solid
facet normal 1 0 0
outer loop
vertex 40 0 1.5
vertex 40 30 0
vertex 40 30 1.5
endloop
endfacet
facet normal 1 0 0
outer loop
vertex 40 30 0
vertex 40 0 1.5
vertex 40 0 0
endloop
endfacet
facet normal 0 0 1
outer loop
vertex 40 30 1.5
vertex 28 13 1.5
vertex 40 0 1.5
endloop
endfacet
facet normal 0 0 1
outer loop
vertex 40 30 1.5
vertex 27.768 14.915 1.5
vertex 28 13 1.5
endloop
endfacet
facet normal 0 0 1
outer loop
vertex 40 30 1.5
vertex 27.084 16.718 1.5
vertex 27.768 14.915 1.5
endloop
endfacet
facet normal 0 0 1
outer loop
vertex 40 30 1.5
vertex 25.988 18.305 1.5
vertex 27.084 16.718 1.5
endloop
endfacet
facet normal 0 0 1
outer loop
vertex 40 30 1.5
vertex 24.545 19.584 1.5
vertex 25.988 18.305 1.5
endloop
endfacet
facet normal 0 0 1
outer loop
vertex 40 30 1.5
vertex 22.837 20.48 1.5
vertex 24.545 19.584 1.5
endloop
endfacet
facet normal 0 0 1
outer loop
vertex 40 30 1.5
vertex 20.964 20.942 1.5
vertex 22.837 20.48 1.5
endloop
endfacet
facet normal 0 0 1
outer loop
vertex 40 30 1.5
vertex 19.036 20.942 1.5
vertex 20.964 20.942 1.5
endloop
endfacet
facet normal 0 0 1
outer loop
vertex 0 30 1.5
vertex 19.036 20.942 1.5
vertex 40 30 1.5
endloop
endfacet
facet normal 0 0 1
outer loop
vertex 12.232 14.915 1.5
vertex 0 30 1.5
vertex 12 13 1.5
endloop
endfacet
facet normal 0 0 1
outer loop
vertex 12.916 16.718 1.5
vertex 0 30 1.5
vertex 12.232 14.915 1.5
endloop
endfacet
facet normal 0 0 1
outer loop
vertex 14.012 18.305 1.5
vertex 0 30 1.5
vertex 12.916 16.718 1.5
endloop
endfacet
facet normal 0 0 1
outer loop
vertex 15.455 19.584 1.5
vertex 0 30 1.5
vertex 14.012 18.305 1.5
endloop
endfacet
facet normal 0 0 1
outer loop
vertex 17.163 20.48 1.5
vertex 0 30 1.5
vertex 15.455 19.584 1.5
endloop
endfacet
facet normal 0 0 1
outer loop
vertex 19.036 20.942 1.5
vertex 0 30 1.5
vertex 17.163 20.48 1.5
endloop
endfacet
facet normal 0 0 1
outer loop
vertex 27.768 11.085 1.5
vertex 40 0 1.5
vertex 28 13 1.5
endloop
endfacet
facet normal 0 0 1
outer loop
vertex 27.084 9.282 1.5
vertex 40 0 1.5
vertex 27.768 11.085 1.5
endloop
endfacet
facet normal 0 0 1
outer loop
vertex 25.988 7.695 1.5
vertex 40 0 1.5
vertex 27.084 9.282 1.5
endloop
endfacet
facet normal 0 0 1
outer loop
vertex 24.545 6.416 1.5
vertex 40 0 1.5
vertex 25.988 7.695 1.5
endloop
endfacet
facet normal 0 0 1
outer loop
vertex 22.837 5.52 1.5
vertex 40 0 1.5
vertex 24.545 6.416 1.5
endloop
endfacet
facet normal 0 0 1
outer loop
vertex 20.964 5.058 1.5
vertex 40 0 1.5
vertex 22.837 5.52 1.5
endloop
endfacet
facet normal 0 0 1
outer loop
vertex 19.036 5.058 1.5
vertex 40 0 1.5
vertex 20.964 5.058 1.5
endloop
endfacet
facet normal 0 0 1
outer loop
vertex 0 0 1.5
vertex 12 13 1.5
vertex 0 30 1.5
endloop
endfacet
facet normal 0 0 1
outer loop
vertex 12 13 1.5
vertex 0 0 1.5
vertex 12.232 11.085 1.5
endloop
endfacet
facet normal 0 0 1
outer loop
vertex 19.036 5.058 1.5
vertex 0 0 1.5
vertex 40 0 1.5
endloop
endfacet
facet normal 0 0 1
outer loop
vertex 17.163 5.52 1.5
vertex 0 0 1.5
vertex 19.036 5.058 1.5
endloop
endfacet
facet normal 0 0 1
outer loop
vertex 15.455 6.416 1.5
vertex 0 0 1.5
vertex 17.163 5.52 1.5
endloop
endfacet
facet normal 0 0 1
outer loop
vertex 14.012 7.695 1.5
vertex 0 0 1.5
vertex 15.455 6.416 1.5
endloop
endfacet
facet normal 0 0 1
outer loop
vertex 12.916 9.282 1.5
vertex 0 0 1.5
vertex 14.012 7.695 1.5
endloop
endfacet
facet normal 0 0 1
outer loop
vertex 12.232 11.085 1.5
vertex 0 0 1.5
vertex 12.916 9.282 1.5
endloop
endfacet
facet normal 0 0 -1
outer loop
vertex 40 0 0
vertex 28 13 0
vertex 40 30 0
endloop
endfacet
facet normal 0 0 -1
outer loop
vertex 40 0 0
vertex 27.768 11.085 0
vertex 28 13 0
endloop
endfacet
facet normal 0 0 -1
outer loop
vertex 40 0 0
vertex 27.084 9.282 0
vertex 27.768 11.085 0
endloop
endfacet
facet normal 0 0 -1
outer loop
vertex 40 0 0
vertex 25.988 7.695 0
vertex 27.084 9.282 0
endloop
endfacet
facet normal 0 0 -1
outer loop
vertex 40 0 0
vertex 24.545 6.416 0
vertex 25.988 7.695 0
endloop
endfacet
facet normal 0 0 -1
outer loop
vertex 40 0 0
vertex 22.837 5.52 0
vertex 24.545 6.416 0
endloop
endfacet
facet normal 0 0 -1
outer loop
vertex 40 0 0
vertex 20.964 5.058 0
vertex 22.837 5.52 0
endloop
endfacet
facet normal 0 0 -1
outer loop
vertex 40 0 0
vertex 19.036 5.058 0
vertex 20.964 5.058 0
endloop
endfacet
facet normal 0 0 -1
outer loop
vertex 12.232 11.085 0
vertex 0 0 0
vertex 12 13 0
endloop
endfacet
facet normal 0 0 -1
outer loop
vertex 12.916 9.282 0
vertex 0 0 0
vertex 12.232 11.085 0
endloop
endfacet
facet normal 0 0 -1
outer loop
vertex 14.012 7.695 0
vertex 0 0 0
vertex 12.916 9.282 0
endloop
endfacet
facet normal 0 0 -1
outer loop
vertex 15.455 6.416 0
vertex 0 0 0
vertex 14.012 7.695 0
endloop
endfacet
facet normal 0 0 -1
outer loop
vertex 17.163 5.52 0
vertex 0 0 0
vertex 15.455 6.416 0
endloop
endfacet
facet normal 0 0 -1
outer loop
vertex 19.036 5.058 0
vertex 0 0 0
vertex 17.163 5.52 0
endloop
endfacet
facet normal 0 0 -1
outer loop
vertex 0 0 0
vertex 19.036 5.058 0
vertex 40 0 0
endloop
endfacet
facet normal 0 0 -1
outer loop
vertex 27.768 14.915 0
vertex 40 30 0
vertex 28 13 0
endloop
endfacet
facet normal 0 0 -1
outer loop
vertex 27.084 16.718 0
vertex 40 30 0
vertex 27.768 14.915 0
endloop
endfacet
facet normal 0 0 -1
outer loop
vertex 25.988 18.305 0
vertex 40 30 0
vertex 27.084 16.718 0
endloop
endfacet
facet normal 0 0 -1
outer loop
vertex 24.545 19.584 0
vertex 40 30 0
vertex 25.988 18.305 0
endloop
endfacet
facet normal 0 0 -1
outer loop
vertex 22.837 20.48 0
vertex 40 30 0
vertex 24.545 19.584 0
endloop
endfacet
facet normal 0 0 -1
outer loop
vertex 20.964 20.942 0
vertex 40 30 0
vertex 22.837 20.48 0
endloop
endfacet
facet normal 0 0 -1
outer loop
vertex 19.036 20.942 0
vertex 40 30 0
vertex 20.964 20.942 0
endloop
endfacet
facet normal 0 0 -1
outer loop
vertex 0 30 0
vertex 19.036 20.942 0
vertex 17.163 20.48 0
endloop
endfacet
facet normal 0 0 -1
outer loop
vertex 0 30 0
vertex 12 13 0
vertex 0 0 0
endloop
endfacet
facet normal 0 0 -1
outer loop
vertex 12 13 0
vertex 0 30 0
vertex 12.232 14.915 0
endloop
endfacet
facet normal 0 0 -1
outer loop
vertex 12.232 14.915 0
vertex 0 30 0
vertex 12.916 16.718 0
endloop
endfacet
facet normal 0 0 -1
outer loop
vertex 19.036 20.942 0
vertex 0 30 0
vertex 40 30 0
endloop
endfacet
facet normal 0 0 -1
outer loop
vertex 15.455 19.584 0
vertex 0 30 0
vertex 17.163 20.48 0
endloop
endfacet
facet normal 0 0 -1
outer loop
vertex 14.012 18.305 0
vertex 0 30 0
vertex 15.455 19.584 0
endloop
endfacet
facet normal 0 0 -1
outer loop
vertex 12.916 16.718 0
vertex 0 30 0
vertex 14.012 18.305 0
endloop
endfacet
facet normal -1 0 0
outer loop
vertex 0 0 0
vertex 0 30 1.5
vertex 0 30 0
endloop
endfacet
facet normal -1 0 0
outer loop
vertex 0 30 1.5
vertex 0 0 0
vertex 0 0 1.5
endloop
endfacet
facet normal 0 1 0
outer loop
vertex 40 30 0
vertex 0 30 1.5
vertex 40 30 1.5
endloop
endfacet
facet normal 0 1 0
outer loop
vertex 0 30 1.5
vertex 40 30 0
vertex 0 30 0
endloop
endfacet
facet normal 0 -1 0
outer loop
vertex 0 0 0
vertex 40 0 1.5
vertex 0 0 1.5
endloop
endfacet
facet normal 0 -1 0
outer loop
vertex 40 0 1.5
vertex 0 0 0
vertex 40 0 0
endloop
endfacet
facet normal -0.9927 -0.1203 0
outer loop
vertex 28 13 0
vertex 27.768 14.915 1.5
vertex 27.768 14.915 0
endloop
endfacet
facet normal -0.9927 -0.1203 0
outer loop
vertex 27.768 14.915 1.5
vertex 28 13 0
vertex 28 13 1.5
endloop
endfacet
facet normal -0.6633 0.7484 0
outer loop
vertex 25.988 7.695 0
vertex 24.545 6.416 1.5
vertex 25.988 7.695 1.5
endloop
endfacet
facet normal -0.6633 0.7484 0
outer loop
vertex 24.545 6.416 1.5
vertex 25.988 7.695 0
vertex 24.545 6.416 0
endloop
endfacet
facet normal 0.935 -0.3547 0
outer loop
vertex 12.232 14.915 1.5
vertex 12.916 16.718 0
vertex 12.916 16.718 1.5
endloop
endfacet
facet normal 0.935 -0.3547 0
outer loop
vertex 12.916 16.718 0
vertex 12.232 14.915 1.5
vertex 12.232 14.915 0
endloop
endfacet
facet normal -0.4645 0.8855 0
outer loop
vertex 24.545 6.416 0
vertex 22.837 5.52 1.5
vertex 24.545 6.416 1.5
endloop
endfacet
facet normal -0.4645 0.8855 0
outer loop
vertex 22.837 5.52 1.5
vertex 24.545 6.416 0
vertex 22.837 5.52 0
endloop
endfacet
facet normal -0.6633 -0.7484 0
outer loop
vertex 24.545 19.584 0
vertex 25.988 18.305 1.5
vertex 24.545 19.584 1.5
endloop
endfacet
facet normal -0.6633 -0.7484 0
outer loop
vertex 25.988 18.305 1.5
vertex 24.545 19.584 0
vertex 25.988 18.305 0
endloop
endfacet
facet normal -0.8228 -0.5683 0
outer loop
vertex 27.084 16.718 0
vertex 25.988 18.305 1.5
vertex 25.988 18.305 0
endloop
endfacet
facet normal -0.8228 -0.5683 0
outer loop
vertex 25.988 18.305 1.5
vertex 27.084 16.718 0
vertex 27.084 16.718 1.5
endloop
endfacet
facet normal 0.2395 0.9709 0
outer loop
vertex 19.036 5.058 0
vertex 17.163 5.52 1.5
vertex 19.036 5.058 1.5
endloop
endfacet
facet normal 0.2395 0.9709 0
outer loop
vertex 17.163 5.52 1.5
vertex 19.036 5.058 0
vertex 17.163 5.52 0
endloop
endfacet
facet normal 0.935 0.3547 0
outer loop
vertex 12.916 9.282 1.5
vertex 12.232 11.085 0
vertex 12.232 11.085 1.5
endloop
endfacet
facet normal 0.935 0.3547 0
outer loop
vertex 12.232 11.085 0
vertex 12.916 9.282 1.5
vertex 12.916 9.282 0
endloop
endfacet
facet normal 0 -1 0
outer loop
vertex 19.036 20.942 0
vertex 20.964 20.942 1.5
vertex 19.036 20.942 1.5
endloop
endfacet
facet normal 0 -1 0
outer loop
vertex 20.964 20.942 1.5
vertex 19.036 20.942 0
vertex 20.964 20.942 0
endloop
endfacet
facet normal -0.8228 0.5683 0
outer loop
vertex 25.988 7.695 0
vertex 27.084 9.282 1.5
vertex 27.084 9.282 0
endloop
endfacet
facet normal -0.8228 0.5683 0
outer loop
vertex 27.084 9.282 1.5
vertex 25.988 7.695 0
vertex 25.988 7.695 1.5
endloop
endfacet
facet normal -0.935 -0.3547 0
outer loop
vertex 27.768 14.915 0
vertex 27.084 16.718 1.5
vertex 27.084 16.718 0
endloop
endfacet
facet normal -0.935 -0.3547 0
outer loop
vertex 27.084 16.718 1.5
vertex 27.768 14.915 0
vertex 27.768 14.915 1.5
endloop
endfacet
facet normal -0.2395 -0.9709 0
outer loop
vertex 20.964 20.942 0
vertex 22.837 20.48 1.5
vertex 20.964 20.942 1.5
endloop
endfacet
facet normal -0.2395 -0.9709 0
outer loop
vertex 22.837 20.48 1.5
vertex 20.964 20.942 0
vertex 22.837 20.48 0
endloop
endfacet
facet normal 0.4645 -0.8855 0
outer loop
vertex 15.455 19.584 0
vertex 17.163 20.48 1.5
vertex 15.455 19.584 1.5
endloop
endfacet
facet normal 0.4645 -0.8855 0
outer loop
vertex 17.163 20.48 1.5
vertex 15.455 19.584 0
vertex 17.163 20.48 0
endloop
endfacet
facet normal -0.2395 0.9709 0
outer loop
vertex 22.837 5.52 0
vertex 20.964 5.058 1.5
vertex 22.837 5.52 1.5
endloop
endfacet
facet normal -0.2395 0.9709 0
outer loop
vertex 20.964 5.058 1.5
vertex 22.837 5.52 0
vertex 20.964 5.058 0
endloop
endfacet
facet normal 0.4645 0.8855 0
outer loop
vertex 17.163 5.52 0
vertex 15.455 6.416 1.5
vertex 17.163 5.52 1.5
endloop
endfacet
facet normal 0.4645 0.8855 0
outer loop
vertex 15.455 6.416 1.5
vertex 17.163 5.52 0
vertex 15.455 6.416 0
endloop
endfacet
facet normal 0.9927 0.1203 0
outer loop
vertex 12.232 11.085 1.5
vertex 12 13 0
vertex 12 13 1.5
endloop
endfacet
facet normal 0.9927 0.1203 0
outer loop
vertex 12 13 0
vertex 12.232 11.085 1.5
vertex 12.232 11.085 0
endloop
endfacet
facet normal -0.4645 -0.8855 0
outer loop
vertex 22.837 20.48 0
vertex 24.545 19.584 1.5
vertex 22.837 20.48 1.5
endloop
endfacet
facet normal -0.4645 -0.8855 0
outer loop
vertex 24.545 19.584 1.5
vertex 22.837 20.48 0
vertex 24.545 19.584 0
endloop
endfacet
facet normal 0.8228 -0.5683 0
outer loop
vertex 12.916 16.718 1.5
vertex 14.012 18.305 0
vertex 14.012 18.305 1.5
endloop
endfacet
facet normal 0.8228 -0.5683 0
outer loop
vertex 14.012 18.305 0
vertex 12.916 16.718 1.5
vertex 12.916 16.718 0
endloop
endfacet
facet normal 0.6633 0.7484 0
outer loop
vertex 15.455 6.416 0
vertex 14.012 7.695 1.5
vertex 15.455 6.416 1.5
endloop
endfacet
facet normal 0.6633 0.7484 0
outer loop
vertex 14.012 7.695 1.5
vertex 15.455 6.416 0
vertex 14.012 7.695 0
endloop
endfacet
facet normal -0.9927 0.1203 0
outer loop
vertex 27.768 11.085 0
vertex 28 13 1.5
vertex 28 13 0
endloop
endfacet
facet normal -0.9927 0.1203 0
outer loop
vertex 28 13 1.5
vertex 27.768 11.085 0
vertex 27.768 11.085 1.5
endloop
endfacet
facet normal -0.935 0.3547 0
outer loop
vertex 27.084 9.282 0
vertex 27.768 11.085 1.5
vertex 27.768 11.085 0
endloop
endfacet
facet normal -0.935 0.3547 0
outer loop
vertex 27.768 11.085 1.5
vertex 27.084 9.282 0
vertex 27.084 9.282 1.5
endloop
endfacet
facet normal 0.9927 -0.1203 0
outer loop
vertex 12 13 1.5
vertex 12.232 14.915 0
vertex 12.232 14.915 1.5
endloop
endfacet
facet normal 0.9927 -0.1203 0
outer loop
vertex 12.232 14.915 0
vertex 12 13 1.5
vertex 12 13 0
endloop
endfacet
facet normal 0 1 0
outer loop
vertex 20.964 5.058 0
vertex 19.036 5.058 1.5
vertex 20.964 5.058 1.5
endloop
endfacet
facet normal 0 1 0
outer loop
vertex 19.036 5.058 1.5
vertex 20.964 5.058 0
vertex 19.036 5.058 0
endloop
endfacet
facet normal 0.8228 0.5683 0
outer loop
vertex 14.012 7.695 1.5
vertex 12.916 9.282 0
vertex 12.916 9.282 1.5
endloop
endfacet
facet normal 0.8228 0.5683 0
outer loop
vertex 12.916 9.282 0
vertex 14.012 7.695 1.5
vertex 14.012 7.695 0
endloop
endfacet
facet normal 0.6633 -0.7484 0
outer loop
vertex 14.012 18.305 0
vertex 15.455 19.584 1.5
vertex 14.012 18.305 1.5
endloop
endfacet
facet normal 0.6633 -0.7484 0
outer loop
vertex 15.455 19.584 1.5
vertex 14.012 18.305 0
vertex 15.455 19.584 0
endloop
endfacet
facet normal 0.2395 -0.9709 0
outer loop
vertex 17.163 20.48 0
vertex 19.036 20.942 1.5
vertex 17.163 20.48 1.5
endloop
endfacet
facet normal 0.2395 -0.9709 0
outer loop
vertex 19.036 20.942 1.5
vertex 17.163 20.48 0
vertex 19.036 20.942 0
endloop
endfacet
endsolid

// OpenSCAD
module roundplate() {
    difference () {
        union() {
            // upper round
            cylinder(d=23, h=1);
            // lower round
            translate([0,0,1])
            cylinder(d=18, h=1);
        }
        // hole for plug
        cylinder(d=16, h=5);
    }
}

module cornerplate() {
    difference () {
        cube([40, 30, 1.5]);
        translate([20, 13, -1]) 
        cylinder(d=16, h=10);
    }
}

cornerplate();
//roundplate();
